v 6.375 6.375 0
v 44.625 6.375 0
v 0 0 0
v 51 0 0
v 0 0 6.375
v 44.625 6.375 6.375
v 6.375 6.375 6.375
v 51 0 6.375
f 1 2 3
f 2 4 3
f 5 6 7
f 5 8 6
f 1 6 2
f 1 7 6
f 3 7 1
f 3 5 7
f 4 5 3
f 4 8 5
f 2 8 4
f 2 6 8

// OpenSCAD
$fn = 150;

linear_extrude(height = 6.375) {
	polygon(points = [[0, 0], [6.375, 6.375], [44.625, 6.375], [51.0, 0]]);
}
